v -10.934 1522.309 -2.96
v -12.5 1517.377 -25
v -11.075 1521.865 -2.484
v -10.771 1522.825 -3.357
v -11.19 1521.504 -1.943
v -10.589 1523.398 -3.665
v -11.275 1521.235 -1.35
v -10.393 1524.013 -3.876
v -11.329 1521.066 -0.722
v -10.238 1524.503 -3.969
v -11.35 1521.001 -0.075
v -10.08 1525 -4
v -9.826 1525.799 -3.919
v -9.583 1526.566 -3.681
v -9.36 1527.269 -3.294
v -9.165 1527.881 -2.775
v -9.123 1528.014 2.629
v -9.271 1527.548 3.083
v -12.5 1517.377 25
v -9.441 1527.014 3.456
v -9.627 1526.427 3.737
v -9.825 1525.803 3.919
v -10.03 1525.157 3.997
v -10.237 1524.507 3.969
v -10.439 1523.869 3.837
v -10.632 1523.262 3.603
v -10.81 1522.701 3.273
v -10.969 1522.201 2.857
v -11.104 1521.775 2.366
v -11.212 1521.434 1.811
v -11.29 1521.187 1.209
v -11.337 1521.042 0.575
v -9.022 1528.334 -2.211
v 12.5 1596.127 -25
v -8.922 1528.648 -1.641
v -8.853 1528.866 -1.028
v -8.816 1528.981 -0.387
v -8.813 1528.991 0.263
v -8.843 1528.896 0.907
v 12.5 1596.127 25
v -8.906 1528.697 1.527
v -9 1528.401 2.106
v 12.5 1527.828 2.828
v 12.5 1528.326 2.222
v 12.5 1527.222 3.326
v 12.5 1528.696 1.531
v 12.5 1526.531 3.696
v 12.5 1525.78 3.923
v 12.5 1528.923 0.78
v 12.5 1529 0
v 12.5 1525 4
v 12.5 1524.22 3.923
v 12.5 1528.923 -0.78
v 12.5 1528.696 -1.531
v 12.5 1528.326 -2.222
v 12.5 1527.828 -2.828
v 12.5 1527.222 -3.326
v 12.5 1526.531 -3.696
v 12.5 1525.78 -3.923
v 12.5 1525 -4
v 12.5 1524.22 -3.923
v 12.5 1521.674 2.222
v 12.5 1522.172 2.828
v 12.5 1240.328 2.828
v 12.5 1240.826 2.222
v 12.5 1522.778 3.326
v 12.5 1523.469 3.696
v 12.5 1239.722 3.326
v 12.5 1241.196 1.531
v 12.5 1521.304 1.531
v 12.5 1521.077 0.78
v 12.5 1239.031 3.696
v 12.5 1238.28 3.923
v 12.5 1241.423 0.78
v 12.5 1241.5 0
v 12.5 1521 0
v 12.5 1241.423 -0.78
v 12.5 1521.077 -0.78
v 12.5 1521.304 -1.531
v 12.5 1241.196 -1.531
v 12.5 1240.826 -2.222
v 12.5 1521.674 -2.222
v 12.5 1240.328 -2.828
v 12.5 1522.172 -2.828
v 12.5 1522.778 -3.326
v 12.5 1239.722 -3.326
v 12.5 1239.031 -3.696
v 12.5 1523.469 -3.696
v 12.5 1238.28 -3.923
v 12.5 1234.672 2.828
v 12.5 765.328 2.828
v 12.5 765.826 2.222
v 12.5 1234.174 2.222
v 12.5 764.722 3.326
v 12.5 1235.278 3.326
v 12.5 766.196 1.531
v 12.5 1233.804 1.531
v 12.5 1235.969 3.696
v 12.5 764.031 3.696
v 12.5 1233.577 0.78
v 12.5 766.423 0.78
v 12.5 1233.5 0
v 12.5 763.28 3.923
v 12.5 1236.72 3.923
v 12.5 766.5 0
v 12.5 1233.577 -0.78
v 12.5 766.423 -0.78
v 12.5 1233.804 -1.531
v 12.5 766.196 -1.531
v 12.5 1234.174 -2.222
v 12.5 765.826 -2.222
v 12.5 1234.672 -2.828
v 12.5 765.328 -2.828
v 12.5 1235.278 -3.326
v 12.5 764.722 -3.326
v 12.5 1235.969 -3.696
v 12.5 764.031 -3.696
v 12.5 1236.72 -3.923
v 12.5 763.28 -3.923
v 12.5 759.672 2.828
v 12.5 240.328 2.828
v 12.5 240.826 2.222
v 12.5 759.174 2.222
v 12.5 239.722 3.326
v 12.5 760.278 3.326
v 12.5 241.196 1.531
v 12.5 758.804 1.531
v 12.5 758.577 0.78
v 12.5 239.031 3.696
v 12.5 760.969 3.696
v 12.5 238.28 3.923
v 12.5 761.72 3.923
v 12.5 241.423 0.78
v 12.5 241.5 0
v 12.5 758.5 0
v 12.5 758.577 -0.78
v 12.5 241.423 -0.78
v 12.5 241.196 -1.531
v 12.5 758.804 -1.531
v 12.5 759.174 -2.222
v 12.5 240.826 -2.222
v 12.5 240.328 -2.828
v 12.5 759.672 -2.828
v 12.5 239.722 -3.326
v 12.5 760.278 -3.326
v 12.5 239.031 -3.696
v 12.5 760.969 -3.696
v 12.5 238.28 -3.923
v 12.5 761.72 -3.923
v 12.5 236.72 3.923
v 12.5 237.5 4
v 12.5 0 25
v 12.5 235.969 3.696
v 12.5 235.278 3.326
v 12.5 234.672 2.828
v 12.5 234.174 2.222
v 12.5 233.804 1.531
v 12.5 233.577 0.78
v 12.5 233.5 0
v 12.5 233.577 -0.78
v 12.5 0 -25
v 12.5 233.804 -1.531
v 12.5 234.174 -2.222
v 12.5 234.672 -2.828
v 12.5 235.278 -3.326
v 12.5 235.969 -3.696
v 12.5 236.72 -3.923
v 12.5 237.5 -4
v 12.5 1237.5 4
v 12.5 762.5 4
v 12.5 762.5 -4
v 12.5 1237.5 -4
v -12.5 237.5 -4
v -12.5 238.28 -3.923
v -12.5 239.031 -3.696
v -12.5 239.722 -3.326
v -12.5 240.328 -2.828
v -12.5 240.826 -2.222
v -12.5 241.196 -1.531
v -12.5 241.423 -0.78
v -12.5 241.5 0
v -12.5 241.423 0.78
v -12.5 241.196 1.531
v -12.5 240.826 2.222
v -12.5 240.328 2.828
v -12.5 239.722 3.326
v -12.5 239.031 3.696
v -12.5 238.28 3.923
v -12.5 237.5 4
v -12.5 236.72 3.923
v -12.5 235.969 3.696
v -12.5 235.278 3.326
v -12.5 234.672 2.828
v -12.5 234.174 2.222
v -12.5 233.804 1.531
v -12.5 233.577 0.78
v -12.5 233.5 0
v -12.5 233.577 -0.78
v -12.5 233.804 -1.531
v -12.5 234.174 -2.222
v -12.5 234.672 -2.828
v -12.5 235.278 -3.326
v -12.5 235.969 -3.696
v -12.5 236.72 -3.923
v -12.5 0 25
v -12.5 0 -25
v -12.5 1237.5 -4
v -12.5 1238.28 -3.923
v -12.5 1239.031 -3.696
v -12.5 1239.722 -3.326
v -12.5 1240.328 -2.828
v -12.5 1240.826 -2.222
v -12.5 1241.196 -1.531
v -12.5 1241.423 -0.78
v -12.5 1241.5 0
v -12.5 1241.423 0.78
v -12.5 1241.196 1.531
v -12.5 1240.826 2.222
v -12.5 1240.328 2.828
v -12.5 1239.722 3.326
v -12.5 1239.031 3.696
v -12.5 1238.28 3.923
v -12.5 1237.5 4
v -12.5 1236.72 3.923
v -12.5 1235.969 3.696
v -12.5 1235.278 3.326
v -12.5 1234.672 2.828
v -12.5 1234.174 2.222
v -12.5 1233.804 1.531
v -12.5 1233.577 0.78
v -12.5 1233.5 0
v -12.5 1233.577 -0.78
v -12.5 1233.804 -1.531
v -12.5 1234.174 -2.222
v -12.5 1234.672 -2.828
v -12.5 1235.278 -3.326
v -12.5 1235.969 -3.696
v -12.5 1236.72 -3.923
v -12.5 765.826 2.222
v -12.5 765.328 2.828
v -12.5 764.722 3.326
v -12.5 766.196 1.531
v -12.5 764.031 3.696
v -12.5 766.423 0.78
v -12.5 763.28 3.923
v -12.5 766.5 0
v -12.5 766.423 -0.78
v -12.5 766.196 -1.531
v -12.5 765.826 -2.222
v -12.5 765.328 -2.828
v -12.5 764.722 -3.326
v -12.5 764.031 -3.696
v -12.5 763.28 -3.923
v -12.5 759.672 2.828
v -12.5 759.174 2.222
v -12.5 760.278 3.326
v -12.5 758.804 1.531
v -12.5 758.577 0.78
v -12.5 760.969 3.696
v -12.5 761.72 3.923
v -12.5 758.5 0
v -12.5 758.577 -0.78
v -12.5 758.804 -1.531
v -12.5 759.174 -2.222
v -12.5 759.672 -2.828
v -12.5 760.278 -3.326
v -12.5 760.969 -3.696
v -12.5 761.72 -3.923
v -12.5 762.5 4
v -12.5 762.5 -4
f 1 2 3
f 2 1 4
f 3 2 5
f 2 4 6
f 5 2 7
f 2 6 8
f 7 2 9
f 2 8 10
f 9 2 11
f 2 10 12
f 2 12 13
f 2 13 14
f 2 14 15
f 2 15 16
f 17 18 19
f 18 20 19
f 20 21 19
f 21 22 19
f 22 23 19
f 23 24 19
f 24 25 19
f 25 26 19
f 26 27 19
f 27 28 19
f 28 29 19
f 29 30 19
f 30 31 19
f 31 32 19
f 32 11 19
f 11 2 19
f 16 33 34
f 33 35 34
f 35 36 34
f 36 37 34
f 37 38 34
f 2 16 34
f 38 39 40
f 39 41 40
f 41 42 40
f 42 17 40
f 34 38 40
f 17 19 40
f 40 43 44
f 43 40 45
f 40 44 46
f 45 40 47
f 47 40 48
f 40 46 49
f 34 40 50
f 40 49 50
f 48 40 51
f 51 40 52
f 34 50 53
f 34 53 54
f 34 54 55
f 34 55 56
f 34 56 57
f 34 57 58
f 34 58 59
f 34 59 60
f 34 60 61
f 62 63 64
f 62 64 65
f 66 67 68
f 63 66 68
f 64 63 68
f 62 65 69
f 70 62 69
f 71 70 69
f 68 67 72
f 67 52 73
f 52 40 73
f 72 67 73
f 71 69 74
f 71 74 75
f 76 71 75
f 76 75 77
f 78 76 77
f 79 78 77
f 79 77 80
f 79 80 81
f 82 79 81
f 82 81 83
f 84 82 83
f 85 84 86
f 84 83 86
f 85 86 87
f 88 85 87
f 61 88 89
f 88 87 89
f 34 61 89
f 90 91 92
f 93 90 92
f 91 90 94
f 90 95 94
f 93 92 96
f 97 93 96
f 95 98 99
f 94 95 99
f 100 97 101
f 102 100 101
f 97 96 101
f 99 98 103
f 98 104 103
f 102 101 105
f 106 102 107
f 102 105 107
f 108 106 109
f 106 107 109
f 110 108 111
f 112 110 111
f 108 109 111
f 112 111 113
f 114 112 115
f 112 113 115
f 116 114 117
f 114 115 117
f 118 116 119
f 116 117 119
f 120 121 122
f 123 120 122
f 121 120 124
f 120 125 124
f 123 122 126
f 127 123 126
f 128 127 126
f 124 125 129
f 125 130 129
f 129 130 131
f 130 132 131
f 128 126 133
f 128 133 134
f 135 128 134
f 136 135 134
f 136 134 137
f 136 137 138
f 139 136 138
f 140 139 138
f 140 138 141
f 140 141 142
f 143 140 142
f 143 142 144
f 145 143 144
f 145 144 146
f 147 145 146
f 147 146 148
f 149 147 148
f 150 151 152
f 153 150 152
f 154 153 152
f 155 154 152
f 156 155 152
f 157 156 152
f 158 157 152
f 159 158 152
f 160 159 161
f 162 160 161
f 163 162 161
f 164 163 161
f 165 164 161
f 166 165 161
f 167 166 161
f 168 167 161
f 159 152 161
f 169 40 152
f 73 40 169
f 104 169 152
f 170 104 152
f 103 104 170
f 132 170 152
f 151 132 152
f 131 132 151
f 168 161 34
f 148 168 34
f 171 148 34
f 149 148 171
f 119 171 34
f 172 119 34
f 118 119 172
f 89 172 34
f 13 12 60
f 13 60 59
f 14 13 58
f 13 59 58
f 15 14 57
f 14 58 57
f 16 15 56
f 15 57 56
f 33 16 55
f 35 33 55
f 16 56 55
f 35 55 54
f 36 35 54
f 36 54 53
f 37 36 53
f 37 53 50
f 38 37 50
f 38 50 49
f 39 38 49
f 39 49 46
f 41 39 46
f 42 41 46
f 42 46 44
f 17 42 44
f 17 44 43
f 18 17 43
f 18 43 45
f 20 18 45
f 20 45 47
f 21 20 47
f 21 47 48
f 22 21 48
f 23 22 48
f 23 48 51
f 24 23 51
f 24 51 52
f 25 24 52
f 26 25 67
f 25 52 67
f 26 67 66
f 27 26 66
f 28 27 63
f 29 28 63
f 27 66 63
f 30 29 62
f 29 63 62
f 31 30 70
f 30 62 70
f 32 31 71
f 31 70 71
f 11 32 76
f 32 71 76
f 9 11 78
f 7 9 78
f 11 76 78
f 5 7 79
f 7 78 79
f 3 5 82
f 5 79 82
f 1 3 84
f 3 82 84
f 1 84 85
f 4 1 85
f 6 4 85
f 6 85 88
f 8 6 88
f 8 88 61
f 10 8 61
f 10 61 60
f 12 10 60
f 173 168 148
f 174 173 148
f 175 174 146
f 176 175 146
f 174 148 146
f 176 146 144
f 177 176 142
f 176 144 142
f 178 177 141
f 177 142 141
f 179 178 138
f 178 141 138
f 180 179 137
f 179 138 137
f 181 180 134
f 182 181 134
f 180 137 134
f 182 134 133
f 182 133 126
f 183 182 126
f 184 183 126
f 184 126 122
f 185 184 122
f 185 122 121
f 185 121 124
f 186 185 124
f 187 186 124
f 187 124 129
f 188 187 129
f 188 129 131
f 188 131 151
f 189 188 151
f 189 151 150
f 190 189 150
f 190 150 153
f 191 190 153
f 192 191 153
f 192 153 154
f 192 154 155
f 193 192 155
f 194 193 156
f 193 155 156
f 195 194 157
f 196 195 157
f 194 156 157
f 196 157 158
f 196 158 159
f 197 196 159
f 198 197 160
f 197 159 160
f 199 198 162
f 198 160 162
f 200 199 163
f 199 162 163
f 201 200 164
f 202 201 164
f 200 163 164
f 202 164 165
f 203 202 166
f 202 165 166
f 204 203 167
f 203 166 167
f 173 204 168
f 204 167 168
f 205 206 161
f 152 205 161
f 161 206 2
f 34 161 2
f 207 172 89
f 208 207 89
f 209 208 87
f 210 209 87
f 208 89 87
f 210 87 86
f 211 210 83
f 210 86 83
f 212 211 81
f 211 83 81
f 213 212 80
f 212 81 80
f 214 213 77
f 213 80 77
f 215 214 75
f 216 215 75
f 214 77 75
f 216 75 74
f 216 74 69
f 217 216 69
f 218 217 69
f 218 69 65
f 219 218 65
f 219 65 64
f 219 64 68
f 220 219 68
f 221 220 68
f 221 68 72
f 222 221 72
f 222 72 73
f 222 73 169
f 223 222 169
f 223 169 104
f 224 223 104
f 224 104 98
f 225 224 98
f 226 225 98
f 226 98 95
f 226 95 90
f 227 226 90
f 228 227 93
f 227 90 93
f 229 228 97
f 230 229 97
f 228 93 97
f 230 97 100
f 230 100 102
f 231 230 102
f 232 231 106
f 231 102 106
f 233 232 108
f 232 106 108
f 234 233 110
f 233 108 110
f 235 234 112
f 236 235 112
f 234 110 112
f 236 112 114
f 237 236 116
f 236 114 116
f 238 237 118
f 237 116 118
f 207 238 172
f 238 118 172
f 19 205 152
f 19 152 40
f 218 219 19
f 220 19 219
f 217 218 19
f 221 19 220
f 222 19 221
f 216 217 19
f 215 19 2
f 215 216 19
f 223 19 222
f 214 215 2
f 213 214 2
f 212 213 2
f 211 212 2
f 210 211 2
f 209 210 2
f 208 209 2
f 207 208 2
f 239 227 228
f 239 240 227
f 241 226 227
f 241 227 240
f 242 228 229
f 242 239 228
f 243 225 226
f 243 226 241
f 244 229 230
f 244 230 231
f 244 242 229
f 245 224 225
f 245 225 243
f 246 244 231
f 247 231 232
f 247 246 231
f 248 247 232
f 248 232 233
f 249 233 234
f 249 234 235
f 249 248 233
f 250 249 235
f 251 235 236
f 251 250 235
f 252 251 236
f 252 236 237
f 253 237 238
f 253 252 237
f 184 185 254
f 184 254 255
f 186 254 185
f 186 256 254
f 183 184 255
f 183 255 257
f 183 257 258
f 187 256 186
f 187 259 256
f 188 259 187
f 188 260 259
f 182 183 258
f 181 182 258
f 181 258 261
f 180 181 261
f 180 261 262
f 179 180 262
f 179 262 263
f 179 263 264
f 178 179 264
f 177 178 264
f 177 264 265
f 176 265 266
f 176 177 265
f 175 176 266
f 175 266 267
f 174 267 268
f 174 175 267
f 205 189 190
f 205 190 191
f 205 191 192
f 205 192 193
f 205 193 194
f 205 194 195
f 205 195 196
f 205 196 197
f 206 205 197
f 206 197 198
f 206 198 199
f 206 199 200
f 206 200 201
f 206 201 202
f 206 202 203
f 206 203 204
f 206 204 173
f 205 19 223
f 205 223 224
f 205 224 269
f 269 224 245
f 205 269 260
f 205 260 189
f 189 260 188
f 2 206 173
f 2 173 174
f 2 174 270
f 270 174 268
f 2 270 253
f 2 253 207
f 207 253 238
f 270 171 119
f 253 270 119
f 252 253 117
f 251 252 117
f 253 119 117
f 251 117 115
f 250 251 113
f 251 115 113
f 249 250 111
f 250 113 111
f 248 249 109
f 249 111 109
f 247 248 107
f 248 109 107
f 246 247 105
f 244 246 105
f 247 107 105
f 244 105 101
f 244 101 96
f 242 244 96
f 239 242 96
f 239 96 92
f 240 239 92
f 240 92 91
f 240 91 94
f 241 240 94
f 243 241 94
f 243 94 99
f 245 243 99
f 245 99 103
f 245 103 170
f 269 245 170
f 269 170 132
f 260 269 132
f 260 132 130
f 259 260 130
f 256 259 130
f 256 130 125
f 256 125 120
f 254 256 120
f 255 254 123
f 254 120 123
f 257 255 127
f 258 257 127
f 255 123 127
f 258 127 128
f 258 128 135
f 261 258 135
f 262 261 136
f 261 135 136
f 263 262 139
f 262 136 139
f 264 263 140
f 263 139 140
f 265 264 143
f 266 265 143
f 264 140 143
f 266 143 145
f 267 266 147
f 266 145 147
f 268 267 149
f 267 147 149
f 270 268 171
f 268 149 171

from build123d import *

# Parameters (mm, degrees)
SKETCH_1_W          = 25
SKETCH_1_H          = 50
EXTRUDE_1_DEPTH     = 1600
SKETCH_4_R          = 4
CUT_EXTRUDE_4_DEPTH = 550
CUT_EXTRUDE_5_DEPTH = 60


with BuildPart() as part:
    # Эскиз1 → Бобышка-Вытянуть1 (new body)
    with BuildSketch(Plane(origin=(0, 0, 0), x_dir=(1, 0, 0), z_dir=(0, 1, 0))):
        Rectangle(SKETCH_1_W, SKETCH_1_H)
    extrude(amount=EXTRUDE_1_DEPTH)

    # Эскиз4 → Вырез-Вытянуть4 (cut)
    with BuildSketch(Plane(origin=(12.5, 0, 0), x_dir=(0, 0, -1), z_dir=(1, 0, 0))):
        with Locations((0, 237.5)):
            Circle(SKETCH_4_R)
        with Locations((0, 762.5)):
            Circle(SKETCH_4_R)
        with Locations((0, 1237.5)):
            Circle(SKETCH_4_R)
        with Locations((0, 1525)):
            Circle(SKETCH_4_R)
    extrude(amount=-CUT_EXTRUDE_4_DEPTH, mode=Mode.SUBTRACT)

    # Эскиз5 → Вырез-Вытянуть5 (cut)
    with BuildSketch(Plane.XY.offset(25)):
        Polygon((-12.5, 1600), (-12.5, 1517.37698565), (12.5, 1596.12698565), (12.5, 1600), align=None)
    extrude(amount=-CUT_EXTRUDE_5_DEPTH, mode=Mode.SUBTRACT)


solid = part.part
